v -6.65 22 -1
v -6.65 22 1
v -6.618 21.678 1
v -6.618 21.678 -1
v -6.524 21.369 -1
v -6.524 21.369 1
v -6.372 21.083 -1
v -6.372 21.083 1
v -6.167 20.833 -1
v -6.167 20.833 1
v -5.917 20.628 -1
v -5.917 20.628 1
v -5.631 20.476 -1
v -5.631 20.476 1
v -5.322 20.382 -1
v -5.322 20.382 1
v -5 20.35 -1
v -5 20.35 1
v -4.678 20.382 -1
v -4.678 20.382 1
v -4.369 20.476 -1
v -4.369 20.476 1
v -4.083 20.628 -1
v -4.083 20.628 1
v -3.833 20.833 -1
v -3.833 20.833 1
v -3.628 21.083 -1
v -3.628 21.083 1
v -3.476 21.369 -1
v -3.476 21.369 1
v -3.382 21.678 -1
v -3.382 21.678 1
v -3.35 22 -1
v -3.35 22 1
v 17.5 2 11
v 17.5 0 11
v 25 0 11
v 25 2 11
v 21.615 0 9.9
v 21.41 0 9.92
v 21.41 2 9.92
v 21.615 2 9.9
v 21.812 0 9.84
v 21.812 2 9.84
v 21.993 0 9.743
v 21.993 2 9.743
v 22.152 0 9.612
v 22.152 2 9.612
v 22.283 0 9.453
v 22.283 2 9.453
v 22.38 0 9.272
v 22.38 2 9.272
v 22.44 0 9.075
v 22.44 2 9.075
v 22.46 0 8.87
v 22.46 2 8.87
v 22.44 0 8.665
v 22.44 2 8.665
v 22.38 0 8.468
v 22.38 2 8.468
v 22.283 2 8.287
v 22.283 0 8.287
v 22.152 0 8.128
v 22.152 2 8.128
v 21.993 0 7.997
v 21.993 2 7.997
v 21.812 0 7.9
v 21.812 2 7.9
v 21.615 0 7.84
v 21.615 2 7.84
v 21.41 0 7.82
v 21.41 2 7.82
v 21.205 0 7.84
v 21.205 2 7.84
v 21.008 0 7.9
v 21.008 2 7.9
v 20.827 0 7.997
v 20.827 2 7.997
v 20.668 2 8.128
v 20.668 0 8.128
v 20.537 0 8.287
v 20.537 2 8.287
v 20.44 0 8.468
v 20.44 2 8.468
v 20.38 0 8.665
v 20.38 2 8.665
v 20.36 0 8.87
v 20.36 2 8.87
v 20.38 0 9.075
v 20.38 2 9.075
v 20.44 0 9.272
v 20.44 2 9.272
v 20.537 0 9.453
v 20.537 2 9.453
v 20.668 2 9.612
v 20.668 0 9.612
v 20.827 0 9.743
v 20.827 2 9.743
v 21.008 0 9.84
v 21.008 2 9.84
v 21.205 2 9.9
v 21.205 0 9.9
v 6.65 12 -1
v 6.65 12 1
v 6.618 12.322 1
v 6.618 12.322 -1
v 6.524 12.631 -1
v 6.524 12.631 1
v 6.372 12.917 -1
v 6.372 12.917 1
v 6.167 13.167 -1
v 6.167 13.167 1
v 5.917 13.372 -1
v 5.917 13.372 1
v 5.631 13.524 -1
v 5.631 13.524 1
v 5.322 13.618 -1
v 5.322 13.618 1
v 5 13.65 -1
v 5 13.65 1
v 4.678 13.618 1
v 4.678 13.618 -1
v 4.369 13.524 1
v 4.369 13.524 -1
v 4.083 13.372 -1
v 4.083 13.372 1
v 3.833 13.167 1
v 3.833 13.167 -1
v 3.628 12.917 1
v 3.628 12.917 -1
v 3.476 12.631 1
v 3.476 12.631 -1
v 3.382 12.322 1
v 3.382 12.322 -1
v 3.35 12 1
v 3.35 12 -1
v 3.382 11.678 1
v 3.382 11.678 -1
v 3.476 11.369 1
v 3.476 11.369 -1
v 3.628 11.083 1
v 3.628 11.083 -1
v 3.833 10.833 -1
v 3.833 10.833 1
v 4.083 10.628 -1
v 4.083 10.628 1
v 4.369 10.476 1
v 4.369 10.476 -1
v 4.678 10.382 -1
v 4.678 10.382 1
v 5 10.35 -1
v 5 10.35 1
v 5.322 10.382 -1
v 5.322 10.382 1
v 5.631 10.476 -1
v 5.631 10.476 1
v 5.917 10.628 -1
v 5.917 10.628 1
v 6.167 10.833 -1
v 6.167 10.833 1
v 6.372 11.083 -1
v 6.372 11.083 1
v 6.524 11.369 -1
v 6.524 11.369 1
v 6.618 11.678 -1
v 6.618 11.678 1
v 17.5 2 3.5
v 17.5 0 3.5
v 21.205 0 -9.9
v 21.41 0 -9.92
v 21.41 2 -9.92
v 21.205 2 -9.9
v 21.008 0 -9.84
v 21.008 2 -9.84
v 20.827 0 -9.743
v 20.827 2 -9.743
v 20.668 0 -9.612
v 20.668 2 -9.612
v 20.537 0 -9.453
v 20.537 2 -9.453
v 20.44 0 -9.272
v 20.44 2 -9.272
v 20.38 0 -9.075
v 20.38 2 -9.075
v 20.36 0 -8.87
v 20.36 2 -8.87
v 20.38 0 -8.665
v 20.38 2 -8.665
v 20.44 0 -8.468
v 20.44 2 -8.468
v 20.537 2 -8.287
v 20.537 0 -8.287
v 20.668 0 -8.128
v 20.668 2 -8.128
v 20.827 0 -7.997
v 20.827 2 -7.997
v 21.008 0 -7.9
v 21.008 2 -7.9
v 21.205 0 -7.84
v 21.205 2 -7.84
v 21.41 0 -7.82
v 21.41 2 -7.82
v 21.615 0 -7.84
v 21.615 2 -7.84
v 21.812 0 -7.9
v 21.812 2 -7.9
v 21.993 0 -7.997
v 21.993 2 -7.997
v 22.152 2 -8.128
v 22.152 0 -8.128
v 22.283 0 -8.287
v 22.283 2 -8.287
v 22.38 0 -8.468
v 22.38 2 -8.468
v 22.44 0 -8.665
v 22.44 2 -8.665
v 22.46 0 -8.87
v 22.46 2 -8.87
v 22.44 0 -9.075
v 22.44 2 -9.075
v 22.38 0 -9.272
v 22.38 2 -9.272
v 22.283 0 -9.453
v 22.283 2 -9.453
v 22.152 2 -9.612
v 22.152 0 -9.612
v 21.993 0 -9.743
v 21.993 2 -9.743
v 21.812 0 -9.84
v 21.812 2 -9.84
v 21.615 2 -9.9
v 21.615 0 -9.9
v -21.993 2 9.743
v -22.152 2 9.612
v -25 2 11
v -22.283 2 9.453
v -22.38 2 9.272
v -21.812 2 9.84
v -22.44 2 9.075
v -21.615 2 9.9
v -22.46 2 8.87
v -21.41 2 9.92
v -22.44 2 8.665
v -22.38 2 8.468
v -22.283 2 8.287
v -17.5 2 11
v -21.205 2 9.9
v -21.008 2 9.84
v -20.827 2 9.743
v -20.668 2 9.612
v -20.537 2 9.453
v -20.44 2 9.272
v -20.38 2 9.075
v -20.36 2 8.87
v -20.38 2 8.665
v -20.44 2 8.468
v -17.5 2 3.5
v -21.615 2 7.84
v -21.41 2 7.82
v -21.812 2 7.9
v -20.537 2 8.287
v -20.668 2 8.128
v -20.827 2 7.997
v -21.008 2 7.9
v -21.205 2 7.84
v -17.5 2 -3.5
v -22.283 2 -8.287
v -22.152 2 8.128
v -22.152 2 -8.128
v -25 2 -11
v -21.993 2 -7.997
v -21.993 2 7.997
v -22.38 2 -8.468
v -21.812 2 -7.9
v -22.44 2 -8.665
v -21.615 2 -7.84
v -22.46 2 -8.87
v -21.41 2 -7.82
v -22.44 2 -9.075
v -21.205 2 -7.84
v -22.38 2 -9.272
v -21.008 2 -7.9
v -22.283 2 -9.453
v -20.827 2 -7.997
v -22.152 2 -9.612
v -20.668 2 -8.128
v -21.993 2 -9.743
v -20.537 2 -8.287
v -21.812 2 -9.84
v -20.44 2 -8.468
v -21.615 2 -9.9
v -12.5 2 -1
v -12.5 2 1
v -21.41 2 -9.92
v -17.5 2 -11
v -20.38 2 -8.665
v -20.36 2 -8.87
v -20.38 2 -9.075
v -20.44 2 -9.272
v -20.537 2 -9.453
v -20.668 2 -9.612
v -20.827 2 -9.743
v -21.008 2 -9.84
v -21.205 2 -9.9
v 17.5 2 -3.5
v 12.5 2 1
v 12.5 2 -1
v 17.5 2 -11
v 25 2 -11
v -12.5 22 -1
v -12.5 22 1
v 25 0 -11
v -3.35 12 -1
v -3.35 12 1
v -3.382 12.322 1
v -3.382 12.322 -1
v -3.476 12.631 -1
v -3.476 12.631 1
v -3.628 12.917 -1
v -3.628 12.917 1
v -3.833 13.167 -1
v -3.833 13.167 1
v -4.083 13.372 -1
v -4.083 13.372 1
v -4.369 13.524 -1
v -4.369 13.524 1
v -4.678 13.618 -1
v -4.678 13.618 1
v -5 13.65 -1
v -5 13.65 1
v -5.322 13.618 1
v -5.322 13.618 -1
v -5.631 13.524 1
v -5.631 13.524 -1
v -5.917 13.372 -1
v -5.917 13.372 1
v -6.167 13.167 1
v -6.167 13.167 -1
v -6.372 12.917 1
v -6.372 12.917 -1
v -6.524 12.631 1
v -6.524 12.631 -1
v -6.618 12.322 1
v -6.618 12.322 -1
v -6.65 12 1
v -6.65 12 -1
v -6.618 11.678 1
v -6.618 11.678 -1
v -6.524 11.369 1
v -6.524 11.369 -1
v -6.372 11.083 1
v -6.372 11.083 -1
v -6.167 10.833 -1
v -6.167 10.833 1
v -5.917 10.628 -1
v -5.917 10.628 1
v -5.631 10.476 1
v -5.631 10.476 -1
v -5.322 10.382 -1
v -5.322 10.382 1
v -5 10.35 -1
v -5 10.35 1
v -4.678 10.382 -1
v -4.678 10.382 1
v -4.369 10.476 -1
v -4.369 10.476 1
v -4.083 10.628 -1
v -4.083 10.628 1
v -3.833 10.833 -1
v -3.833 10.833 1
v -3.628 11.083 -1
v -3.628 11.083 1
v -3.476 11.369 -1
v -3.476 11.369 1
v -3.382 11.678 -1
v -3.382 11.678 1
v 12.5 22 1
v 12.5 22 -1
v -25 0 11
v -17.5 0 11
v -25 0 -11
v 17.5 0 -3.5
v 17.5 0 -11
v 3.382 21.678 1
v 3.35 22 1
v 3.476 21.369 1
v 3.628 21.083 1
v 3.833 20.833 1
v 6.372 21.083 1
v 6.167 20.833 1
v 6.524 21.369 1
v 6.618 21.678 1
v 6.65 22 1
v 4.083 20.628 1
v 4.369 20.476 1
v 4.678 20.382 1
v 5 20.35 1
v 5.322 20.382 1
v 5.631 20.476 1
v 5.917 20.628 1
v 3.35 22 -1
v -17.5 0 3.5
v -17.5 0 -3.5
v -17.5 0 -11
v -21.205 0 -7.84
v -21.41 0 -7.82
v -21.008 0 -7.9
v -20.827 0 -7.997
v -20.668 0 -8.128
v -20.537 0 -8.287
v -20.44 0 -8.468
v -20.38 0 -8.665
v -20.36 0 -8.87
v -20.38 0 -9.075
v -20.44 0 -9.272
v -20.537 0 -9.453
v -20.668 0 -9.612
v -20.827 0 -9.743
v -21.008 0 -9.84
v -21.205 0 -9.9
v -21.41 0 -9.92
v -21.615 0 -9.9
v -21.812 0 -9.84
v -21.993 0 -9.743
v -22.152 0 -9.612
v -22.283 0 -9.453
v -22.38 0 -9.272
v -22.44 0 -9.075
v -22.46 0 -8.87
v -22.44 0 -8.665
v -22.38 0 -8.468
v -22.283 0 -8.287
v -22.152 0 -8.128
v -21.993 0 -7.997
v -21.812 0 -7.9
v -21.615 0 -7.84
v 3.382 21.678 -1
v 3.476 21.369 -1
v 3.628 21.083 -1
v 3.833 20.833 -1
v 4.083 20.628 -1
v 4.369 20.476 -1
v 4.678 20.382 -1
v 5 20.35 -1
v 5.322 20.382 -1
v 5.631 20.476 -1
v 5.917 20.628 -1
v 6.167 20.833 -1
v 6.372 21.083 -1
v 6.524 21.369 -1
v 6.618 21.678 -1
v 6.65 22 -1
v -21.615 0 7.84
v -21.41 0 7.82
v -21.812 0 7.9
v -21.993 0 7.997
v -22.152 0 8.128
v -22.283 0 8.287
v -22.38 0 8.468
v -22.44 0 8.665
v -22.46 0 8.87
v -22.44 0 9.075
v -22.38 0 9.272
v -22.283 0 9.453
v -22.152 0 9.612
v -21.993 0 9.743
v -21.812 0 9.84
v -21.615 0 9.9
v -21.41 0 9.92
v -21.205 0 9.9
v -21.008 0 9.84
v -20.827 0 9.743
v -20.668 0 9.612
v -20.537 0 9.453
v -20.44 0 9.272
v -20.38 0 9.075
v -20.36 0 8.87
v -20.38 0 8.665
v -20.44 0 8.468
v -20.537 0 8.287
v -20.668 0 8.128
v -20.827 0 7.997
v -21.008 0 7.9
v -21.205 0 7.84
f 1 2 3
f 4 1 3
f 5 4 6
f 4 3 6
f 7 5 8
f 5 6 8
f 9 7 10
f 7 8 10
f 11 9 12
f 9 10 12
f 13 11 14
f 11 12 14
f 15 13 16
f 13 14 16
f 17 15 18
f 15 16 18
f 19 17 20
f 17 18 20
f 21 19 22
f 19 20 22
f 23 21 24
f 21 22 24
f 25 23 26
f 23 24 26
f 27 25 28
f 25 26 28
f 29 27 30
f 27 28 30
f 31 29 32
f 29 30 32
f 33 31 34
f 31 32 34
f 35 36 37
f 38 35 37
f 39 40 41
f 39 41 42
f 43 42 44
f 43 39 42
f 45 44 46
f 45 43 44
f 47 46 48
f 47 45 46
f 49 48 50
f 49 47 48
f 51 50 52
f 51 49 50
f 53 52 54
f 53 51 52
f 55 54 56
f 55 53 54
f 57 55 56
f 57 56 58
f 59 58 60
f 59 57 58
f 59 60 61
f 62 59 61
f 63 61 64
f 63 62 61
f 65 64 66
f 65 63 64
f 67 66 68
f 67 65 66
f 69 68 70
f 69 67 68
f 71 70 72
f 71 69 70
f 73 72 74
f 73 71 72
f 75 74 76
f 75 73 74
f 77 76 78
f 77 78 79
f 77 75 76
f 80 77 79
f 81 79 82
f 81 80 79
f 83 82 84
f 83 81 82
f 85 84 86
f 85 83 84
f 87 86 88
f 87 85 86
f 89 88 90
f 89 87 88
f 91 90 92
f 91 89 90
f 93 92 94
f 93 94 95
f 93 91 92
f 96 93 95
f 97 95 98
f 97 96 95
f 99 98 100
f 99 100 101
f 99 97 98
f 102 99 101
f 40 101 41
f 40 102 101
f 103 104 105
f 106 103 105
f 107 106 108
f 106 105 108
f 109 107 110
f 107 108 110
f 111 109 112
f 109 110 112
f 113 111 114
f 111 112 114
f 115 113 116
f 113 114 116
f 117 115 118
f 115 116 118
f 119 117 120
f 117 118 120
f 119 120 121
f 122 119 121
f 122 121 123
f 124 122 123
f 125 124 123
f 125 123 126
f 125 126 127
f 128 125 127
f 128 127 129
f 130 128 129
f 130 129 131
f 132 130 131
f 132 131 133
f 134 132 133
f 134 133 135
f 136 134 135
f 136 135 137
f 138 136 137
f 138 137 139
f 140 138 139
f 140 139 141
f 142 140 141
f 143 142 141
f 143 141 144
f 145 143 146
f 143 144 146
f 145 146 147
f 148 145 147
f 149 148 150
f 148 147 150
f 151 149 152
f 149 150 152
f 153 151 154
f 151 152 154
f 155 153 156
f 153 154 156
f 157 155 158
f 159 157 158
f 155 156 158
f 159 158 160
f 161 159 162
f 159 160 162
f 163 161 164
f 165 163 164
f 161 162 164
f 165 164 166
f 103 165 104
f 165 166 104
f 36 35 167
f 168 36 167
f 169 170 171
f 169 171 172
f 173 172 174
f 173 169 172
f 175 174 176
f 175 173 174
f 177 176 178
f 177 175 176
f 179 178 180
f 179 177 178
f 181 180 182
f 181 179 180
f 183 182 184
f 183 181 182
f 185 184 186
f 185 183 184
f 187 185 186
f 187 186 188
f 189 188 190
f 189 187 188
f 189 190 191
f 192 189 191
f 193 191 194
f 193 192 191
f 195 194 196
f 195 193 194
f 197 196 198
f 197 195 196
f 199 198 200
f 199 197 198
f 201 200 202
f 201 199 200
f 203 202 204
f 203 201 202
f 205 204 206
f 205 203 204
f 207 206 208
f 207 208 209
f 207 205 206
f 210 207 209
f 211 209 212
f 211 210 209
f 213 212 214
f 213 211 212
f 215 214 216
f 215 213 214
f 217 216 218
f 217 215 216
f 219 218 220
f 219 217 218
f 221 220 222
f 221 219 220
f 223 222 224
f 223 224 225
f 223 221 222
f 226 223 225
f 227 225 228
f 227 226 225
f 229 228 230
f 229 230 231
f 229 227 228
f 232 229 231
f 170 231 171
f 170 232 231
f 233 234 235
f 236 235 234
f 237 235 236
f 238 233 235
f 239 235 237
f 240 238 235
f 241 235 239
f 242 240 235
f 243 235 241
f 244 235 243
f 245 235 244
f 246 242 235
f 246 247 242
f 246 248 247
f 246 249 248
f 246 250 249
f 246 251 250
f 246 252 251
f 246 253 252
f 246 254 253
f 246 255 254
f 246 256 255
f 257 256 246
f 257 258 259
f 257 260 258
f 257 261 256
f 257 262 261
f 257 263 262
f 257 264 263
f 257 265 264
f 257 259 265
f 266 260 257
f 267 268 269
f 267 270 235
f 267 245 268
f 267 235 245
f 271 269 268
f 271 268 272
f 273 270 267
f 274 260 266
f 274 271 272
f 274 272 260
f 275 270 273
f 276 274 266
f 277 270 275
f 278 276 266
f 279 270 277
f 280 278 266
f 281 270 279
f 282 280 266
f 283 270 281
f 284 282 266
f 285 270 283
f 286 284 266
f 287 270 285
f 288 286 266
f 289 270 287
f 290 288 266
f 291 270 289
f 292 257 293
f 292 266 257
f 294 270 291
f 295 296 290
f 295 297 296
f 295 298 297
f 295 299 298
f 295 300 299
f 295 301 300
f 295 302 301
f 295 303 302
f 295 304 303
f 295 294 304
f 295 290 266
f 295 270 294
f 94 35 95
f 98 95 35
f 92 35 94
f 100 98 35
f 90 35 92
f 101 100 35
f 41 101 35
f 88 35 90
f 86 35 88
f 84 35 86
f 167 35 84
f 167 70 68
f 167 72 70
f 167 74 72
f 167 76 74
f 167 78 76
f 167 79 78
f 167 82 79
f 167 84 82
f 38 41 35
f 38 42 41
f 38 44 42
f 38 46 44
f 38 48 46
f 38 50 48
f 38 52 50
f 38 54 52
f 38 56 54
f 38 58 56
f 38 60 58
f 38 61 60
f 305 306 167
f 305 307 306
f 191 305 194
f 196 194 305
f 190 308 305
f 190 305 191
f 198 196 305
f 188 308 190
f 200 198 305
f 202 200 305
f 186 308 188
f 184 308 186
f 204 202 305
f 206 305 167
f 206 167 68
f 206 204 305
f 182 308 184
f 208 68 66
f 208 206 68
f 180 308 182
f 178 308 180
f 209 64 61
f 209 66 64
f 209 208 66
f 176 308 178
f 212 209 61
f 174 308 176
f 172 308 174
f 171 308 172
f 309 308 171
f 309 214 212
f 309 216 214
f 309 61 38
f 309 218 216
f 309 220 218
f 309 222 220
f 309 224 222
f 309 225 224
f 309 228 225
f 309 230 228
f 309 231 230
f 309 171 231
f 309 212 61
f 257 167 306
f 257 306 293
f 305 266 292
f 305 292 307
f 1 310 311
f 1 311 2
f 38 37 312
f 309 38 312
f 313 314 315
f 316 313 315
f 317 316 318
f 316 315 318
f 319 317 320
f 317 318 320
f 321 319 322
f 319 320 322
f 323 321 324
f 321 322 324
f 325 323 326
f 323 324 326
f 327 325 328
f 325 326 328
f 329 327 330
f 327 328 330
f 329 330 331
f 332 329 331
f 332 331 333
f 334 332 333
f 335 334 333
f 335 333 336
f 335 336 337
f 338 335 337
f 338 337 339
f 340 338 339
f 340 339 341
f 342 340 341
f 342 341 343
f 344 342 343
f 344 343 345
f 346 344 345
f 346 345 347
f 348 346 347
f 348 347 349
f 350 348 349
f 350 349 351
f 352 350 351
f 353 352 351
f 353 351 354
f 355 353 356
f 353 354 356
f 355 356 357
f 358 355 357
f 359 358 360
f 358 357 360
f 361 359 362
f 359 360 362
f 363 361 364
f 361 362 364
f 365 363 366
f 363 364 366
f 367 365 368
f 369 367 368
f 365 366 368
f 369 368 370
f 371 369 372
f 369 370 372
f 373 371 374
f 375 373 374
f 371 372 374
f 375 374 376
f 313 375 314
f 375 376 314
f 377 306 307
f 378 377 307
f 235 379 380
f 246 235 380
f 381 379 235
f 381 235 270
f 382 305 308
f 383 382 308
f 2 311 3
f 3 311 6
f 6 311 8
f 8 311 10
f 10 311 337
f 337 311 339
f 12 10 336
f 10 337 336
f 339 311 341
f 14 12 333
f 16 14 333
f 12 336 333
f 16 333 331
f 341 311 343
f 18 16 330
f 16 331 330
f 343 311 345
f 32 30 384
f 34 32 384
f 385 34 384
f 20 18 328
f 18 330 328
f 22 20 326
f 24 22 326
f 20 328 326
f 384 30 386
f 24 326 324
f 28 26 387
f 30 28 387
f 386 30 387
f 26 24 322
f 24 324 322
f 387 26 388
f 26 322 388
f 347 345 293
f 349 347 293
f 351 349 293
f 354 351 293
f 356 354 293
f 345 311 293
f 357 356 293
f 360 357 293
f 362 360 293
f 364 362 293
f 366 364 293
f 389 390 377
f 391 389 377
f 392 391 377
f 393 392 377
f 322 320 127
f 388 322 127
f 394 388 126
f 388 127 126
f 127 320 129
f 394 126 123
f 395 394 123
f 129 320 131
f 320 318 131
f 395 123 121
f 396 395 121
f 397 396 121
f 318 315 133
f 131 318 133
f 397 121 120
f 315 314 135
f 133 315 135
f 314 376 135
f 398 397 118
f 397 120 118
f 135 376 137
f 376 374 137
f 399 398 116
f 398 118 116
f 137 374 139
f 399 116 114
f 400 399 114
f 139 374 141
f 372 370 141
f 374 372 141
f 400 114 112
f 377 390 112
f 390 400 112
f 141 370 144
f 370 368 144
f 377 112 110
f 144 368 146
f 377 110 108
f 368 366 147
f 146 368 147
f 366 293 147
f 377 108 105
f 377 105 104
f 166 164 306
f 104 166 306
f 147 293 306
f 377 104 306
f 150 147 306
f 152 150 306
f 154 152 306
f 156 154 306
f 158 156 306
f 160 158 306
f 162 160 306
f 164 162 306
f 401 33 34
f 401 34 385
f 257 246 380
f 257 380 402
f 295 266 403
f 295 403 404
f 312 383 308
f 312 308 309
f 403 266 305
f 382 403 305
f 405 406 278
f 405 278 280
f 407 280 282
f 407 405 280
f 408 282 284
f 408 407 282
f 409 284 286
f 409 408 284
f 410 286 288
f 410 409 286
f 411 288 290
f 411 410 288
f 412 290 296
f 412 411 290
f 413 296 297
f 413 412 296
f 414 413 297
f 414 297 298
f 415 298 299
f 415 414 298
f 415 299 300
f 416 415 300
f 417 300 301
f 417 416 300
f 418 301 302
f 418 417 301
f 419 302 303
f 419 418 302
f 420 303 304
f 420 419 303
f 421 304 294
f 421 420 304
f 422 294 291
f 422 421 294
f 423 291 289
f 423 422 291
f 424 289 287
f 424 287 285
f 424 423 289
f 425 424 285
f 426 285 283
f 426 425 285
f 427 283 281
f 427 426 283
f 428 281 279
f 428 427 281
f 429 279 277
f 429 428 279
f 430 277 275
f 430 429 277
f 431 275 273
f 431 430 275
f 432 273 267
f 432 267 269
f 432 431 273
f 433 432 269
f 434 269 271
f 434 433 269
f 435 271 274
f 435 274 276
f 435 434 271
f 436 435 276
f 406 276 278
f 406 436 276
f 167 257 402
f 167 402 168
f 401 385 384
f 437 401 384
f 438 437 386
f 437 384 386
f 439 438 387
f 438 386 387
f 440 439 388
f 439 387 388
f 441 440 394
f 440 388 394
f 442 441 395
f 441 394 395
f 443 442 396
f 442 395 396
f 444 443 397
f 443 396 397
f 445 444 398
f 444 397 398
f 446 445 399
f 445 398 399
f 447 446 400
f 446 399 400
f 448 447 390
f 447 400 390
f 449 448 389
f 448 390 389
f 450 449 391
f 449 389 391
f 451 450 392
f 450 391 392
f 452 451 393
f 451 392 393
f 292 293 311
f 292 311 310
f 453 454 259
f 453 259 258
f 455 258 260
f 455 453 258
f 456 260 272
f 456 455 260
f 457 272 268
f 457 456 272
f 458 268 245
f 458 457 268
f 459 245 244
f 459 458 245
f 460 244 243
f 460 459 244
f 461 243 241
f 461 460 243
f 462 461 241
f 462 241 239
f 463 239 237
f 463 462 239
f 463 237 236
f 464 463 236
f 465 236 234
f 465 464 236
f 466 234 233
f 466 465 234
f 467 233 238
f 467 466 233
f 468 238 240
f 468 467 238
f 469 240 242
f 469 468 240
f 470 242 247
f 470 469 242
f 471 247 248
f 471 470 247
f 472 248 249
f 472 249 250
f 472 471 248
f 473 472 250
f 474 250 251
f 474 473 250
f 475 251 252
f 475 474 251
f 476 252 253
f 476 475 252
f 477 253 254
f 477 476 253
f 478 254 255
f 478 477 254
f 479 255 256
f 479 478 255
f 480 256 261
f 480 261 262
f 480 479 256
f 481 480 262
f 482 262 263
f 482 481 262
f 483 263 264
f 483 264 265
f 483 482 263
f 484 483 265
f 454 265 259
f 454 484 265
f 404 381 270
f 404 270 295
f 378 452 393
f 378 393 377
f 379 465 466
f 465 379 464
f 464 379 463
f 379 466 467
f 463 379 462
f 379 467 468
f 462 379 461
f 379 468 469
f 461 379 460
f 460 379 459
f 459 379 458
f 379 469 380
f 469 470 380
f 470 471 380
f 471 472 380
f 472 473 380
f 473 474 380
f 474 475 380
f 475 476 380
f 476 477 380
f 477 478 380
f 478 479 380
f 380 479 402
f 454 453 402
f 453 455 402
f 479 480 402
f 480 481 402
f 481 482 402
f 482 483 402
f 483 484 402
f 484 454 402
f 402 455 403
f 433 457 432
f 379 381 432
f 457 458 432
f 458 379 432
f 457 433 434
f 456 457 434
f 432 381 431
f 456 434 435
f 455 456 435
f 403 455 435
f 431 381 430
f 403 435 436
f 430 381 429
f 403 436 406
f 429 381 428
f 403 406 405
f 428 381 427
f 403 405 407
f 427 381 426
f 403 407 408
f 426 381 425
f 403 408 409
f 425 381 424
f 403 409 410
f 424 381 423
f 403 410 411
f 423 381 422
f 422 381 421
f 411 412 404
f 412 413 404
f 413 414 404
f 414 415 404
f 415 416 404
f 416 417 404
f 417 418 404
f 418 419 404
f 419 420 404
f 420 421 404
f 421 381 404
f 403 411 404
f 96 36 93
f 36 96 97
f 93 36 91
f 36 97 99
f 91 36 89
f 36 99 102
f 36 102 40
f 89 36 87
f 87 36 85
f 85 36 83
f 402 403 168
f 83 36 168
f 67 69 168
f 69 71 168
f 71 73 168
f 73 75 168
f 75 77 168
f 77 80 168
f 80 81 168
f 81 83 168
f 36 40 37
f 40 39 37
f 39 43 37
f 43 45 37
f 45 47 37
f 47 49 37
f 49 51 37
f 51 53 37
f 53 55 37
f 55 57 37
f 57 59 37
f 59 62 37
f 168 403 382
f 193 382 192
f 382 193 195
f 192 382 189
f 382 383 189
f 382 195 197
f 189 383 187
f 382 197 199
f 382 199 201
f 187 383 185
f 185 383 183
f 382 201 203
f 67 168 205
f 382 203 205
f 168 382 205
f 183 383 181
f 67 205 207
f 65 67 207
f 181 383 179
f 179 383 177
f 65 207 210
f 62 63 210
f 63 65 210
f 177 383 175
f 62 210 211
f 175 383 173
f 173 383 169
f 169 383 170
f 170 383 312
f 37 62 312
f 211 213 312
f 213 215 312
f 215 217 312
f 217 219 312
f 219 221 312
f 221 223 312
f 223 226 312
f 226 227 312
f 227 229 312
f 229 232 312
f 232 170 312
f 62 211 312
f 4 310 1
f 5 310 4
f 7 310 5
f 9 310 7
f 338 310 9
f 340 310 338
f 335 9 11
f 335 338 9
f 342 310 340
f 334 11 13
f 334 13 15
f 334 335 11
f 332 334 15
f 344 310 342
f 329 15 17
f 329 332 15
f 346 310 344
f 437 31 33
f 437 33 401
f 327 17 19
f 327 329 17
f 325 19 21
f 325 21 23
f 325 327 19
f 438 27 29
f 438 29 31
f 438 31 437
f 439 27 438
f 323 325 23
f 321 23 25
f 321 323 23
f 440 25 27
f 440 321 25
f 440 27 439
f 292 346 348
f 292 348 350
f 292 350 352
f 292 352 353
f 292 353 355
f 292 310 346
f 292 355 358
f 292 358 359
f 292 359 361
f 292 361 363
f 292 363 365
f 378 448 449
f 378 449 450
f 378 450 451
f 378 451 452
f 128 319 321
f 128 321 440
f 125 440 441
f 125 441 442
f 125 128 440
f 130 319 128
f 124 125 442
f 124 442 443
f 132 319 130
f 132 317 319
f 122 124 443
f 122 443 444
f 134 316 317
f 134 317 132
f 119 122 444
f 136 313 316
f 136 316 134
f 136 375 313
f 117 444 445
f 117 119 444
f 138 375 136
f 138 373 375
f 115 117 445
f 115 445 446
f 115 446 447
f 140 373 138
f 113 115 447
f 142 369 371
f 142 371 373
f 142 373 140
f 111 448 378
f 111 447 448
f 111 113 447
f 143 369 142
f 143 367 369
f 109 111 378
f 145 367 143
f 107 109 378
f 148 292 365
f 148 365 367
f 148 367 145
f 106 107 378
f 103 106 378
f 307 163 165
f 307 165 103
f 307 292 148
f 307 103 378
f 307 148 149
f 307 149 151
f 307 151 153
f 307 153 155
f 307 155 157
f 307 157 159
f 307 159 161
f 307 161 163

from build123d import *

# Parameters (mm, degrees)
SKETCH_1_W          = 50
SKETCH_1_H          = 22
SKETCH_1_R          = 1.05
EXTRUDE_1_DEPTH     = 2
SKETCH_2_W          = 25
SKETCH_2_H          = 2
EXTRUDE_2_DEPTH     = 20
SKETCH_3_R          = 1.65
CUT_EXTRUDE_1_DEPTH = 30
SKETCH_4_W          = 35
SKETCH_4_H          = 15
CUT_EXTRUDE_2_DEPTH = 30


with BuildPart() as part:
    # 草图1 → 凸台-拉伸1 (new body)
    with BuildSketch(Plane(origin=(0, 0, 0), x_dir=(1, 0, 0), z_dir=(0, 1, 0))):
        Rectangle(SKETCH_1_W, SKETCH_1_H)
        with Locations(Location((-21.41, 8.87, 0), (0, 0, 270))):
            Circle(SKETCH_1_R, mode=Mode.SUBTRACT)
        with Locations(Location((-21.41, -8.87, 0), (0, 0, 90))):
            Circle(SKETCH_1_R, mode=Mode.SUBTRACT)
        with Locations(Location((21.41, -8.87, 0), (0, 0, 270))):
            Circle(SKETCH_1_R, mode=Mode.SUBTRACT)
        with Locations(Location((21.41, 8.87, 0), (0, 0, 90))):
            Circle(SKETCH_1_R, mode=Mode.SUBTRACT)
    extrude(amount=EXTRUDE_1_DEPTH)

    # 草图2 → 凸台-拉伸2 (add)
    with BuildSketch(Plane(origin=(0, 2, 0), x_dir=(1, 0, 0), z_dir=(0, 1, 0))):
        Rectangle(SKETCH_2_W, SKETCH_2_H)
    extrude(amount=EXTRUDE_2_DEPTH)

    # 草图3 → 切除-拉伸1 (cut)
    with BuildSketch(Plane.XY.offset(1)):
        with Locations((-5, 22)):
            Circle(SKETCH_3_R)
        with Locations((-5, 12)):
            Circle(SKETCH_3_R)
        with Locations((5, 12)):
            Circle(SKETCH_3_R)
        with Locations((5, 22)):
            Circle(SKETCH_3_R)
    extrude(amount=-CUT_EXTRUDE_1_DEPTH, mode=Mode.SUBTRACT)

    # 草图4 → 切除-拉伸2 (cut)
    with BuildSketch(Plane(origin=(0, 2, 0), x_dir=(1, 0, 0), z_dir=(0, 1, 0))):
        with Locations((0, -11)):
            Rectangle(SKETCH_4_W, SKETCH_4_H)
        with Locations((0, 11)):
            Rectangle(SKETCH_4_W, SKETCH_4_H)
    extrude(amount=-CUT_EXTRUDE_2_DEPTH, mode=Mode.SUBTRACT)


solid = part.part
